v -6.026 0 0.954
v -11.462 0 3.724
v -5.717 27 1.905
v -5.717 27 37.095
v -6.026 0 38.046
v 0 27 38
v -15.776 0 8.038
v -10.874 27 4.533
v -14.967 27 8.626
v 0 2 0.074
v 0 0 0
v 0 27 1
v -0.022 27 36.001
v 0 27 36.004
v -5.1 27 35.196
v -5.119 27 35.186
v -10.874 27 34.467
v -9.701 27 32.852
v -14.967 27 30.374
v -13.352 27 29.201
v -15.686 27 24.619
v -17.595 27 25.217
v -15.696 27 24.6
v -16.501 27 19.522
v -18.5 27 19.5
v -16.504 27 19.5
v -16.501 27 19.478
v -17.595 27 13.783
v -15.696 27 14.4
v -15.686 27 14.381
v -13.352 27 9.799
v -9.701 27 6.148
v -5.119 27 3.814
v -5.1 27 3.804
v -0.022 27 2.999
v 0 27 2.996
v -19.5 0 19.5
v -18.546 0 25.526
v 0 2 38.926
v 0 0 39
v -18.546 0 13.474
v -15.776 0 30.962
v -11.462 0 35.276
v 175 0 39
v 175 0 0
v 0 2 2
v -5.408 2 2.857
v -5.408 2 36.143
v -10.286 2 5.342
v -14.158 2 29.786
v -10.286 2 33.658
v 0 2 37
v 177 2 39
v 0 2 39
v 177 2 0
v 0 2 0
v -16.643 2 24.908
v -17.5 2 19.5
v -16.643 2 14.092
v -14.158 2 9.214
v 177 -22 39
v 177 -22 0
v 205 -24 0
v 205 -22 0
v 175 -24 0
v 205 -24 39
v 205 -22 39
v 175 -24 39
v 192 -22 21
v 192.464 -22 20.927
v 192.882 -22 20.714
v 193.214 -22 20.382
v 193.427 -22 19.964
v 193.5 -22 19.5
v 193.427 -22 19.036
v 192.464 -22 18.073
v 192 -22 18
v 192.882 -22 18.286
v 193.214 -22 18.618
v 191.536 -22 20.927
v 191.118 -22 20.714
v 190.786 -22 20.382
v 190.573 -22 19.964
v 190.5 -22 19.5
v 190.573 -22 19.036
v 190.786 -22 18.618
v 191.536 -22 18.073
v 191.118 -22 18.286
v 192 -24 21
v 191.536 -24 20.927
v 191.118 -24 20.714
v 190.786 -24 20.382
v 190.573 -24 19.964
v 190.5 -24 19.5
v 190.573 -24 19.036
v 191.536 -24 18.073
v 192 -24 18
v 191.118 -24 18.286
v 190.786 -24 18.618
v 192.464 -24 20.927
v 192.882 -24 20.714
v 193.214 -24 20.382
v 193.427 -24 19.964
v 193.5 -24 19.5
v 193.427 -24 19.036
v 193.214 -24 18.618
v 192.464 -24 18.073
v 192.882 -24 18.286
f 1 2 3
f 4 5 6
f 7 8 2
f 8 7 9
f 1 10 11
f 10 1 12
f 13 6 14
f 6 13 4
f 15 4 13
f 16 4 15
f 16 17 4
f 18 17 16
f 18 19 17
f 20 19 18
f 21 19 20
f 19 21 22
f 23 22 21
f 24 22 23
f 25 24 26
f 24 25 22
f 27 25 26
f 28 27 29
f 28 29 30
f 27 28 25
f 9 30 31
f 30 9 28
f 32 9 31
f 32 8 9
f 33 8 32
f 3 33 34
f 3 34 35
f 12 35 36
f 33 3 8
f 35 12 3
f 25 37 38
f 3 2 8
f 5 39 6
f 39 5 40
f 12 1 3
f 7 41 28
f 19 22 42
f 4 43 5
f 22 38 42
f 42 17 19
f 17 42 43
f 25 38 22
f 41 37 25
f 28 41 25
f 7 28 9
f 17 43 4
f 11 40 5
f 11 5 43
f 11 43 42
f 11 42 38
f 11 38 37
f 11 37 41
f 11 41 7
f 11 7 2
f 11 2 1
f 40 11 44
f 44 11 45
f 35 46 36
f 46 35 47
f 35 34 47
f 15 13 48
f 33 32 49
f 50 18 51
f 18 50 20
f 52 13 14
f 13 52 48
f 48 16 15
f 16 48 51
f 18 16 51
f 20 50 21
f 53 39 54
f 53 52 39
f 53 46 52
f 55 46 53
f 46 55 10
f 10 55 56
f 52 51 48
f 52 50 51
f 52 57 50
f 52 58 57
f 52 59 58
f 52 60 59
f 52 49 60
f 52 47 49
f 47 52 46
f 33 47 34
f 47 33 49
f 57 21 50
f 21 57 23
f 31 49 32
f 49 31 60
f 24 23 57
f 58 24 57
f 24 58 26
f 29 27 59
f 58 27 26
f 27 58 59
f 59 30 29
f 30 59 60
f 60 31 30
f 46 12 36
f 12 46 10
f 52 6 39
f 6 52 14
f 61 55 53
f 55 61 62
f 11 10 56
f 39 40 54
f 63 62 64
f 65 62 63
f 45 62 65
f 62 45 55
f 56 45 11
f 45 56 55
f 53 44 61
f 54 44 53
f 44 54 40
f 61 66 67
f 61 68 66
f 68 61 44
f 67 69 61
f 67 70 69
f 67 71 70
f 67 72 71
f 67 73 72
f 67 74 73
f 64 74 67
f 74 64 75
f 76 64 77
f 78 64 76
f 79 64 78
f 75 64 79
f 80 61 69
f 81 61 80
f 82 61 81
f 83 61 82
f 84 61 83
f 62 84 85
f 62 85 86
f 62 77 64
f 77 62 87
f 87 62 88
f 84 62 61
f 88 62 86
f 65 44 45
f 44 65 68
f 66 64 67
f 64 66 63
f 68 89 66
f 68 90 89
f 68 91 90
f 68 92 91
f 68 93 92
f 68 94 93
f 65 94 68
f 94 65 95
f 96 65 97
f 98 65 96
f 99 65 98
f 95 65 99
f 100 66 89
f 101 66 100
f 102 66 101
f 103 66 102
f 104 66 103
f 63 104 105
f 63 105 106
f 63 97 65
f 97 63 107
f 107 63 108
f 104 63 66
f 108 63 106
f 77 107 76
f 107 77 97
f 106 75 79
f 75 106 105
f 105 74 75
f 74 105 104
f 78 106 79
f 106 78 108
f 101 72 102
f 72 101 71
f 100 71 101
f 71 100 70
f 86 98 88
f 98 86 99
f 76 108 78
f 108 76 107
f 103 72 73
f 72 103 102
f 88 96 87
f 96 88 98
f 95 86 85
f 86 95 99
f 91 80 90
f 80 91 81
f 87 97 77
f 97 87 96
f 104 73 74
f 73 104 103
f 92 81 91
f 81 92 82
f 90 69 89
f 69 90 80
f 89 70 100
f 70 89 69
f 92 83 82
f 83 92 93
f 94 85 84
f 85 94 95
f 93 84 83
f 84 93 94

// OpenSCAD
wallThickness=2;
cupLength = 25;
cupDiameter1 = 35;
cupDiameter2 = 33;
riser=175;
wallTopWidth=20;
wallTopFlange=30;
holeDiameter=3;

module cup() {
    difference() {
        cylinder(h=cupLength+wallThickness,
            d1=cupDiameter1 + 2 * wallThickness,
            d2=cupDiameter2 + 2 * wallThickness);
        translate([0,0,wallThickness])
            cylinder(h=cupLength+0.1,
                d1=cupDiameter1, d2 = cupDiameter2);
        translate([0, -(cupDiameter1/2 + wallThickness + 0.1), wallThickness])
            cube([cupDiameter1/2 + 2 * wallThickness + 0.1,
                  cupDiameter1 + 2 * wallThickness + 0.1,
                  cupLength + 0.1]);
    }
}

module assemblyBeforeHole() {
    union(){
        cup();
        translate([0,-(cupDiameter1 + 2*wallThickness)/2,0])
            cube([riser+wallThickness, 
                  cupDiameter1 + 2*wallThickness,
                  wallThickness]);
        translate([riser,
            -(cupDiameter1 + 2*wallThickness)/2,
            -(wallTopWidth + wallThickness)])
            cube([wallThickness, 
                cupDiameter1 + 2*wallThickness,
                wallTopWidth + 2*wallThickness]);
        translate([riser,
            -(cupDiameter1 + 2*wallThickness)/2,
            -(wallTopWidth + 2*wallThickness)])
            cube([wallTopFlange, 
                cupDiameter1 + 2*wallThickness,
                wallThickness]);
    }
}

module assembly() {
    $fn=20;
    difference(){
        assemblyBeforeHole();
        translate([riser+wallThickness+wallTopFlange/2,
            0,
            -(wallTopWidth + 2*wallThickness+0.1)])
            cylinder(h=2*wallThickness,d=holeDiameter);
    }
}

// Move into a printable position
translate([0,0,(cupDiameter1 + 2*wallThickness)/2])
    rotate([-90,0,0])
        assembly();
